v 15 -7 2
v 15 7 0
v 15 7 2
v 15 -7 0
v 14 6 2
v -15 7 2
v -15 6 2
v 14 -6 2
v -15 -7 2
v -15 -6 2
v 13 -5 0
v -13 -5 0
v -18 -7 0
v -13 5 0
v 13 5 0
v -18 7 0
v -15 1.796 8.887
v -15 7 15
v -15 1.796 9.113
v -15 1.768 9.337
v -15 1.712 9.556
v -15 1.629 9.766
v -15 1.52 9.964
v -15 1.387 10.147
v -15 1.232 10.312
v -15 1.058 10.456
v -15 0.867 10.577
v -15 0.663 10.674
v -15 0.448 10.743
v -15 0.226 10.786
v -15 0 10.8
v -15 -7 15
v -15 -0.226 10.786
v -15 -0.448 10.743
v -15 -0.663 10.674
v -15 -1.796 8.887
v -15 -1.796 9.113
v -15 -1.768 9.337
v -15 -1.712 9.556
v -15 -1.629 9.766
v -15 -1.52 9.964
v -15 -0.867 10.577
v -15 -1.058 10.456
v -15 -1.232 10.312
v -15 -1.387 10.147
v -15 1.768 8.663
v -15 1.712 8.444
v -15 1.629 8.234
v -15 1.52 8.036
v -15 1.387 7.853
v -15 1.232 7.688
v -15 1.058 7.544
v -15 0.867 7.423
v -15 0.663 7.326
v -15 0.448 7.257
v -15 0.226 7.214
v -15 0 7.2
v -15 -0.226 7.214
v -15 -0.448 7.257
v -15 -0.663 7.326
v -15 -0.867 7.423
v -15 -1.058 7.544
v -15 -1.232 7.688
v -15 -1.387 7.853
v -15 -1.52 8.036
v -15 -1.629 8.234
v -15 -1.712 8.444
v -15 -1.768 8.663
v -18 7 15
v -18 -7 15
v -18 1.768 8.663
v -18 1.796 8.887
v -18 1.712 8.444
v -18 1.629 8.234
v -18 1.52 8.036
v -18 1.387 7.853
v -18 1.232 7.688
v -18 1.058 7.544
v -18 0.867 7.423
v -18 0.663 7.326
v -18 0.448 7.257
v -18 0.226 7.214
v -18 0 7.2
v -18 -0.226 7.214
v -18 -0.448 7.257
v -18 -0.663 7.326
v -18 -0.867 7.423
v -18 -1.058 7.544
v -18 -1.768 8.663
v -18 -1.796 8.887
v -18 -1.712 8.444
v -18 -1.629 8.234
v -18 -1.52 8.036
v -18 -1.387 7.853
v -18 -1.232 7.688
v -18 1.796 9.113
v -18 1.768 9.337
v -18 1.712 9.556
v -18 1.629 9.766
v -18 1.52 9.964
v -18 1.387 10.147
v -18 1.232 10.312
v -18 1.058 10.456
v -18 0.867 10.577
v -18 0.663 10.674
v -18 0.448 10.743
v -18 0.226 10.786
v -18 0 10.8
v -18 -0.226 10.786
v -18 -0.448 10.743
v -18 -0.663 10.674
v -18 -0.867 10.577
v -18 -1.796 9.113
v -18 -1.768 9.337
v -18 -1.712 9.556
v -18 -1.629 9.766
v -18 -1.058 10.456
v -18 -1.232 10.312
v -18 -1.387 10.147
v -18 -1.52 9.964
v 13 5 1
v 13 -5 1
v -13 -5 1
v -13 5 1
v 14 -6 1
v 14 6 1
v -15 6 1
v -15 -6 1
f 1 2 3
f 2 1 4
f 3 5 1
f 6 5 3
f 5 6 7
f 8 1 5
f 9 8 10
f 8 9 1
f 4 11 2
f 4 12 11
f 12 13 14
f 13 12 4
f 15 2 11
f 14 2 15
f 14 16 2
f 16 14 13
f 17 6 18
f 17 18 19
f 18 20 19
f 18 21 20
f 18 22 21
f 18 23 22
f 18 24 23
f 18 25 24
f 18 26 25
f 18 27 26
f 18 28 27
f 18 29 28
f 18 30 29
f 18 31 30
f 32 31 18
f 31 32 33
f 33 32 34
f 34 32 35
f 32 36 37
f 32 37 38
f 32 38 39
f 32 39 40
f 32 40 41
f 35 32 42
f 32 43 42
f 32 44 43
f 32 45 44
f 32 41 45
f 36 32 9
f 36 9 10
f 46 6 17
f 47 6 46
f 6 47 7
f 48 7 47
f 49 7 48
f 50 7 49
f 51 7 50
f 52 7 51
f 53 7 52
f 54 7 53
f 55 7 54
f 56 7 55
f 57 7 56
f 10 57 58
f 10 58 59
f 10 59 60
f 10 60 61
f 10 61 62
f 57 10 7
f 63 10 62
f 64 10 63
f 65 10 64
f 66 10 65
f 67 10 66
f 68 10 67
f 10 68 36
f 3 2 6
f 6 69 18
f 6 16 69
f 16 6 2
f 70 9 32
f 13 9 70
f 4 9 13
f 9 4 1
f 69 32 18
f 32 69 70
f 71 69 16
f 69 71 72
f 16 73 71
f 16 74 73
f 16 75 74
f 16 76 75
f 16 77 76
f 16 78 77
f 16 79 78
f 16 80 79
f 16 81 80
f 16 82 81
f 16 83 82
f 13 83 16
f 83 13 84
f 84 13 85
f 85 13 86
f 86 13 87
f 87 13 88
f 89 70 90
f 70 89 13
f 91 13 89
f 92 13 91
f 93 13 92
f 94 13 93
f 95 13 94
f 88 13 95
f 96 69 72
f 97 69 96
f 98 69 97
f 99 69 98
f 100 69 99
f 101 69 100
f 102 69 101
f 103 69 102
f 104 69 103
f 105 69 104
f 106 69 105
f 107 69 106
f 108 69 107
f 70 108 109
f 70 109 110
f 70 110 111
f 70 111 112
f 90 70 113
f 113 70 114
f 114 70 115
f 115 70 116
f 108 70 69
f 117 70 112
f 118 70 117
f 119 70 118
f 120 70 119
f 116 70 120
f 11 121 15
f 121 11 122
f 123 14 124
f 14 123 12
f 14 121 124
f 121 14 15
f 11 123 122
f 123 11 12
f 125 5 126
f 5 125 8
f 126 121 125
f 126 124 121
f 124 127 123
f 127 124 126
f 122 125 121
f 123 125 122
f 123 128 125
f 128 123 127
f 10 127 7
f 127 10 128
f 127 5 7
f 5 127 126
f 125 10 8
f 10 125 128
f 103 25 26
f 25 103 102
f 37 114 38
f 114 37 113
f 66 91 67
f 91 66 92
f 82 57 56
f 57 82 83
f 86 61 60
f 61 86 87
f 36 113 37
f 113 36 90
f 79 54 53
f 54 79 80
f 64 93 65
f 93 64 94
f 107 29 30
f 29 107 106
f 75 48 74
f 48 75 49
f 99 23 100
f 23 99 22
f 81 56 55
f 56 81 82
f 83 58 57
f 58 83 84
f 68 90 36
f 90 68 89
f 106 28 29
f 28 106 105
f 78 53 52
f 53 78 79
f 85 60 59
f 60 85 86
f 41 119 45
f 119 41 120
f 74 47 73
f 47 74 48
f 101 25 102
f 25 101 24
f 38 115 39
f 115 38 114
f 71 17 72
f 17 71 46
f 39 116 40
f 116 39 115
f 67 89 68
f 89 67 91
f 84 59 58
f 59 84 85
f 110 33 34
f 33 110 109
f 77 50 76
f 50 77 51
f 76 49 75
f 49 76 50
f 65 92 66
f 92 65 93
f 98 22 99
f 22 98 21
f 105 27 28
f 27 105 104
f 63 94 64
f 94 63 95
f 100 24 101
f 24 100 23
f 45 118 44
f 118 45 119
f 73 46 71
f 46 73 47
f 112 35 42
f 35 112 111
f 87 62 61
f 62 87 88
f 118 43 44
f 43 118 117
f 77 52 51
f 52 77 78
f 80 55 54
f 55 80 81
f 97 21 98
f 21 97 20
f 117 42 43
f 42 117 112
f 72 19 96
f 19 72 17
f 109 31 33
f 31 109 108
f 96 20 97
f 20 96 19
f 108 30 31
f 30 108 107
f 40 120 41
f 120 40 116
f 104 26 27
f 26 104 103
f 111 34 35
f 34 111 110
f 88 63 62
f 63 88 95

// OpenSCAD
$fn = 50;


difference() {
	union() {
		translate(v = [-15.0000000000, -7.0000000000, 0]) {
			cube(size = [30, 14, 2]);
		}
		translate(v = [-18.0000000000, -7.0000000000, 0]) {
			cube(size = [3, 14, 15]);
		}
	}
	union() {
		translate(v = [-13.0000000000, -5.0000000000, 0]) {
			cube(size = [26, 10, 2]);
		}
		translate(v = [-15.0000000000, -6.0000000000, 1]) {
			cube(size = [29, 12, 1]);
		}
		#translate(v = [-25.0000000000, 0, 9]) {
			rotate(a = [0, 90, 0]) {
				cylinder(h = 20, r = 1.8000000000);
			}
		}
	}
}
